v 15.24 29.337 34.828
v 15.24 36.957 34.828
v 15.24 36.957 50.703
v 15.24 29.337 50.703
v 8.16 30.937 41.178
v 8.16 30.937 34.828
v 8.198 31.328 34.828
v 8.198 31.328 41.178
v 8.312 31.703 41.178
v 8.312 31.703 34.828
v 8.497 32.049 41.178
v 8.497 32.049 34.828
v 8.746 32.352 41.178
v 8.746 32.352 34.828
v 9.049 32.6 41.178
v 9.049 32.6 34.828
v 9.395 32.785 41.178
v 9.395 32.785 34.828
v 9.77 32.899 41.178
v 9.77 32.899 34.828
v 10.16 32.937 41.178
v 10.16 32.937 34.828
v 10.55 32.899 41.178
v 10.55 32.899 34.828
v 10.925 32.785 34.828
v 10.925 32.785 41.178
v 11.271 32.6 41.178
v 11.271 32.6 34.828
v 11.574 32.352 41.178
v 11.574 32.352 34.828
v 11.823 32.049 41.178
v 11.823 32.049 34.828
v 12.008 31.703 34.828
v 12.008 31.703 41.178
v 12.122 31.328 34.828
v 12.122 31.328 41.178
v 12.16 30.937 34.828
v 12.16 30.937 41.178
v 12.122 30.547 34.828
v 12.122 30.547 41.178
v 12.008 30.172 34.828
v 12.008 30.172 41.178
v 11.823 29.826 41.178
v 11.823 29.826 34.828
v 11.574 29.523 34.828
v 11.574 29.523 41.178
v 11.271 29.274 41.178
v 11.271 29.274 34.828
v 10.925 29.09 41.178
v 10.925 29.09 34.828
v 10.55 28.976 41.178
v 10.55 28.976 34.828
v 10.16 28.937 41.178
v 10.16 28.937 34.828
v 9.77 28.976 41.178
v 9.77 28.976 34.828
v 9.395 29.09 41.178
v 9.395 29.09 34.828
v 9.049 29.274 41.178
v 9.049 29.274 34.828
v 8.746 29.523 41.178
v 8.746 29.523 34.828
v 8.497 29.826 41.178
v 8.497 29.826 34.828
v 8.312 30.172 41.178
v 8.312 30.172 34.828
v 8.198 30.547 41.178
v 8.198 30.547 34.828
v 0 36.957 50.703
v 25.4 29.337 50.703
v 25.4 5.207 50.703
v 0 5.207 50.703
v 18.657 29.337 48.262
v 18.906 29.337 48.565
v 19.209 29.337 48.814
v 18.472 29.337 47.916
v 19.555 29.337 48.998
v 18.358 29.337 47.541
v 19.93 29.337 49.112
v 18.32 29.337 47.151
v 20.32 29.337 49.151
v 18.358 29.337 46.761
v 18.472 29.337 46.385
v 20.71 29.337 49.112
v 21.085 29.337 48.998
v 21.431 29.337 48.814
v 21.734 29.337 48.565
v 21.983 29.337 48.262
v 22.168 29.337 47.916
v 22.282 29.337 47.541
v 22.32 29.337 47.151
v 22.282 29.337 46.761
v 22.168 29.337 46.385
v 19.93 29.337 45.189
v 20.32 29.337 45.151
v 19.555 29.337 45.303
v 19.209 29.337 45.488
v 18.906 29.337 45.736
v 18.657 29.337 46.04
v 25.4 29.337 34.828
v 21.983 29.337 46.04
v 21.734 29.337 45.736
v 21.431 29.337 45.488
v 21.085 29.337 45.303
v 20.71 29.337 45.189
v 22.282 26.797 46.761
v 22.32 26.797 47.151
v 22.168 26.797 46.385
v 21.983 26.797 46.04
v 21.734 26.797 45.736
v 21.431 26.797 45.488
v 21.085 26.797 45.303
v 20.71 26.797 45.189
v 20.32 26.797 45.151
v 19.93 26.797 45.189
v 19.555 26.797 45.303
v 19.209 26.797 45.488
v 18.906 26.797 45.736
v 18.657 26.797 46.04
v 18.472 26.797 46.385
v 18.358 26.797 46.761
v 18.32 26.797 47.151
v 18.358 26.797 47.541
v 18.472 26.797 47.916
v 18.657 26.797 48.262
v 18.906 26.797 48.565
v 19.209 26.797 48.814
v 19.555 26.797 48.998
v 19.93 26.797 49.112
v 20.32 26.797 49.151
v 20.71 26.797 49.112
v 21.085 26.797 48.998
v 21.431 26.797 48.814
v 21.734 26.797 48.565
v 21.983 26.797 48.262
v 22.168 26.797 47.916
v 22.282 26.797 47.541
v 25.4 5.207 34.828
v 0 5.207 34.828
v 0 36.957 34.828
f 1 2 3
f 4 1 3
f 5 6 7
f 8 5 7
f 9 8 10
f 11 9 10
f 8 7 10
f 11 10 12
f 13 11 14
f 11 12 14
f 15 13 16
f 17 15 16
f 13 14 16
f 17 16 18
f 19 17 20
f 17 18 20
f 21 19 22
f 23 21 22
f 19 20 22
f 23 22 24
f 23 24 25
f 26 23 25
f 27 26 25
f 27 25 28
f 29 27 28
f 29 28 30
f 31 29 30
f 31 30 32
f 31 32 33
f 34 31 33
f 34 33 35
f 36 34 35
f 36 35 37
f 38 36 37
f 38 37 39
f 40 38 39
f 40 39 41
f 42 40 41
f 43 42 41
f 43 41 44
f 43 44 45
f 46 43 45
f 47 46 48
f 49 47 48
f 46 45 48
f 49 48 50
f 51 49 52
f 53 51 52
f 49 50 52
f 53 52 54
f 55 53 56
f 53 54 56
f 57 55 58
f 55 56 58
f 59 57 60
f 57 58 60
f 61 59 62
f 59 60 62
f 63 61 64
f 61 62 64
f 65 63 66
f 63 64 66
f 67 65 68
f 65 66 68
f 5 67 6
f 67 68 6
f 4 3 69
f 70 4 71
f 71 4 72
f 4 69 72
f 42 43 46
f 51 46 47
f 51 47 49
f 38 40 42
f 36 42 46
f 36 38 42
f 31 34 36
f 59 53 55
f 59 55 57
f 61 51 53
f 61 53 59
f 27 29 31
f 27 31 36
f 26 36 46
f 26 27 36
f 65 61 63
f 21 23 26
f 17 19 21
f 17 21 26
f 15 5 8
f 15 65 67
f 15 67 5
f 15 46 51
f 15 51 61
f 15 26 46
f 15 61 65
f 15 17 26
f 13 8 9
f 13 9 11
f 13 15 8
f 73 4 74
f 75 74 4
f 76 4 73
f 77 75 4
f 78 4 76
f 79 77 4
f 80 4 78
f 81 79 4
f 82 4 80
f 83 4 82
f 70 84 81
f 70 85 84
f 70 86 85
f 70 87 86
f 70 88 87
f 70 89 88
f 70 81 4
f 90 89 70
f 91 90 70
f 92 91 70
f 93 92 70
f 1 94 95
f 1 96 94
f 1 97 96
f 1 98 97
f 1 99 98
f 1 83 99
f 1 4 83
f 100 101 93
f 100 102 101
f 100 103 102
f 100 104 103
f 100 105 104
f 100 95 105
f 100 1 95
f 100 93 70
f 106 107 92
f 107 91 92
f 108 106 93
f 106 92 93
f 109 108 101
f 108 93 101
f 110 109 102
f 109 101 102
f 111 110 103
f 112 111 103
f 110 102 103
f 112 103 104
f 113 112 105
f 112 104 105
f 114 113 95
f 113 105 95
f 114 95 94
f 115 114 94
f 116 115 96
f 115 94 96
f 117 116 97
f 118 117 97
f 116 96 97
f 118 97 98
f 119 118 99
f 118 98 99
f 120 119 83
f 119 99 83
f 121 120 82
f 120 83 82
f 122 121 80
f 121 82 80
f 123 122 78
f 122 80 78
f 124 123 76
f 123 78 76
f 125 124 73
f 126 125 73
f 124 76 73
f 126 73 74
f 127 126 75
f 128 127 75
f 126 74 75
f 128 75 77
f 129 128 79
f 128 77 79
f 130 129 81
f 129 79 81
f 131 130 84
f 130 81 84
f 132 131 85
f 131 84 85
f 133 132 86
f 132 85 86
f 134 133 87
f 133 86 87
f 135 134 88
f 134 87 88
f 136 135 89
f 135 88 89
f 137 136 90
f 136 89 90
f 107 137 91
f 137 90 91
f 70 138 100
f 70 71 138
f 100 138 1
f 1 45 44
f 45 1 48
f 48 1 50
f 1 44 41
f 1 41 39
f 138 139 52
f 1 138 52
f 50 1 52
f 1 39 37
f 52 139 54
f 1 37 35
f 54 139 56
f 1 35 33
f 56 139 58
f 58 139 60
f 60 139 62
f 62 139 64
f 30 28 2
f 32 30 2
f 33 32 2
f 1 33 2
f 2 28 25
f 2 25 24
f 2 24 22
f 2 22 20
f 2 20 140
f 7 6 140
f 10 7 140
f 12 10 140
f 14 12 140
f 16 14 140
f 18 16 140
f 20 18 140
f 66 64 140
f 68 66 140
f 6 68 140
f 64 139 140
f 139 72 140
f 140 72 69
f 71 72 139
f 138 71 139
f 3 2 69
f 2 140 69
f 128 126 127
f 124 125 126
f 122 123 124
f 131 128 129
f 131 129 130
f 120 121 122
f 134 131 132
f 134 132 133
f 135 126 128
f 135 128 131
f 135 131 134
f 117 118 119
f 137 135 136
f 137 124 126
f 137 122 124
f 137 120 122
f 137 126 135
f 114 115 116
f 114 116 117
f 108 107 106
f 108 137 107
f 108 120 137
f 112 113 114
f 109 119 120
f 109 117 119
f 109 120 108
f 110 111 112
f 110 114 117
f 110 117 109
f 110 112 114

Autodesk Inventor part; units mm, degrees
ref_plane "YZ Plane" through (0, 0, 0) normal (1, 0, 0) x (0, 1, 0)
ref_plane "XZ Plane" through (0, 0, 0) normal (0, 1, 0) x (-1, 0, 0)
ref_plane "XY Plane" through (0, 0, 0) normal (0, 0, 1) x (1, 0, 0)
sketch "Sketch1" plane through (0, 0, 0) normal (1, 0, 0) x (0, 1, 0)
  line L0 (36.9572, 50.7029) -> (5.2072, 50.7029)
  line L1 (5.2072, 50.7029) -> (5.2072, 34.8279)
  line L2 (5.2072, 34.8279) -> (36.9572, 34.8279)
  line L3 (36.9572, 34.8279) -> (36.9572, 50.7029)
  point P0 (0, 0)
  dimension "d0" = 31.75
  dimension "d1" = 15.875
extrude "Extrusion1" add sketch "Sketch1" along normal blind 25.4
sketch "Sketch2" plane through (0, 36.9572, 50.7029) normal (0, 1, 0) x (1, 0, 0)
  line L0 (25.4, 0) -> (25.4, 15.875) projected
  line L1 (0, 0) -> (25.4, 0) projected
  line L2 (25.4, 15.875) -> (15.24, 15.875)
  line L3 (15.24, 15.875) -> (15.24, 0)
  line L4 (15.24, 0) -> (25.4, 0)
  line L5 (25.4, 0) -> (25.4, 15.875)
  point P0 (0, 50.7029)
  dimension "d4" = 10.16
extrude "Extrusion2" cut sketch "Sketch2" against normal blind 7.62
sketch "Sketch3" plane through (0, 29.3372, 50.7029) normal (0, 1, 0) x (1, 0, 0)
  line L0 (15.24, 0) -> (15.24, 15.875) projected
  line L1 (25.4, 0) -> (15.24, 0) projected
  line L2 (25.4, 15.875) -> (25.4, 0) projected
  line L3 (15.24, 15.875) -> (25.4, 15.875) projected
  circle A0 centre (20.32, 3.5522) radius 2
  point P0 (0, 50.7029)
  dimension "d7" = 4
  dimension "d8" = 5.08
  dimension "d9" = 3.5522
extrude "Extrusion3" cut sketch "Sketch3" against normal blind 2.54 contours A0
sketch "Sketch4" plane through (0, 5.2072, 34.8279) normal (0, 0, -1) x (-1, 0, 0)
  circle A0 centre (-10.16, 25.7302) radius 2 projected
  point P0 (0, -5.2072)
extrude "Extrusion4" cut sketch "Sketch4" against normal blind 6.35
properties part number "Meal inside front"
